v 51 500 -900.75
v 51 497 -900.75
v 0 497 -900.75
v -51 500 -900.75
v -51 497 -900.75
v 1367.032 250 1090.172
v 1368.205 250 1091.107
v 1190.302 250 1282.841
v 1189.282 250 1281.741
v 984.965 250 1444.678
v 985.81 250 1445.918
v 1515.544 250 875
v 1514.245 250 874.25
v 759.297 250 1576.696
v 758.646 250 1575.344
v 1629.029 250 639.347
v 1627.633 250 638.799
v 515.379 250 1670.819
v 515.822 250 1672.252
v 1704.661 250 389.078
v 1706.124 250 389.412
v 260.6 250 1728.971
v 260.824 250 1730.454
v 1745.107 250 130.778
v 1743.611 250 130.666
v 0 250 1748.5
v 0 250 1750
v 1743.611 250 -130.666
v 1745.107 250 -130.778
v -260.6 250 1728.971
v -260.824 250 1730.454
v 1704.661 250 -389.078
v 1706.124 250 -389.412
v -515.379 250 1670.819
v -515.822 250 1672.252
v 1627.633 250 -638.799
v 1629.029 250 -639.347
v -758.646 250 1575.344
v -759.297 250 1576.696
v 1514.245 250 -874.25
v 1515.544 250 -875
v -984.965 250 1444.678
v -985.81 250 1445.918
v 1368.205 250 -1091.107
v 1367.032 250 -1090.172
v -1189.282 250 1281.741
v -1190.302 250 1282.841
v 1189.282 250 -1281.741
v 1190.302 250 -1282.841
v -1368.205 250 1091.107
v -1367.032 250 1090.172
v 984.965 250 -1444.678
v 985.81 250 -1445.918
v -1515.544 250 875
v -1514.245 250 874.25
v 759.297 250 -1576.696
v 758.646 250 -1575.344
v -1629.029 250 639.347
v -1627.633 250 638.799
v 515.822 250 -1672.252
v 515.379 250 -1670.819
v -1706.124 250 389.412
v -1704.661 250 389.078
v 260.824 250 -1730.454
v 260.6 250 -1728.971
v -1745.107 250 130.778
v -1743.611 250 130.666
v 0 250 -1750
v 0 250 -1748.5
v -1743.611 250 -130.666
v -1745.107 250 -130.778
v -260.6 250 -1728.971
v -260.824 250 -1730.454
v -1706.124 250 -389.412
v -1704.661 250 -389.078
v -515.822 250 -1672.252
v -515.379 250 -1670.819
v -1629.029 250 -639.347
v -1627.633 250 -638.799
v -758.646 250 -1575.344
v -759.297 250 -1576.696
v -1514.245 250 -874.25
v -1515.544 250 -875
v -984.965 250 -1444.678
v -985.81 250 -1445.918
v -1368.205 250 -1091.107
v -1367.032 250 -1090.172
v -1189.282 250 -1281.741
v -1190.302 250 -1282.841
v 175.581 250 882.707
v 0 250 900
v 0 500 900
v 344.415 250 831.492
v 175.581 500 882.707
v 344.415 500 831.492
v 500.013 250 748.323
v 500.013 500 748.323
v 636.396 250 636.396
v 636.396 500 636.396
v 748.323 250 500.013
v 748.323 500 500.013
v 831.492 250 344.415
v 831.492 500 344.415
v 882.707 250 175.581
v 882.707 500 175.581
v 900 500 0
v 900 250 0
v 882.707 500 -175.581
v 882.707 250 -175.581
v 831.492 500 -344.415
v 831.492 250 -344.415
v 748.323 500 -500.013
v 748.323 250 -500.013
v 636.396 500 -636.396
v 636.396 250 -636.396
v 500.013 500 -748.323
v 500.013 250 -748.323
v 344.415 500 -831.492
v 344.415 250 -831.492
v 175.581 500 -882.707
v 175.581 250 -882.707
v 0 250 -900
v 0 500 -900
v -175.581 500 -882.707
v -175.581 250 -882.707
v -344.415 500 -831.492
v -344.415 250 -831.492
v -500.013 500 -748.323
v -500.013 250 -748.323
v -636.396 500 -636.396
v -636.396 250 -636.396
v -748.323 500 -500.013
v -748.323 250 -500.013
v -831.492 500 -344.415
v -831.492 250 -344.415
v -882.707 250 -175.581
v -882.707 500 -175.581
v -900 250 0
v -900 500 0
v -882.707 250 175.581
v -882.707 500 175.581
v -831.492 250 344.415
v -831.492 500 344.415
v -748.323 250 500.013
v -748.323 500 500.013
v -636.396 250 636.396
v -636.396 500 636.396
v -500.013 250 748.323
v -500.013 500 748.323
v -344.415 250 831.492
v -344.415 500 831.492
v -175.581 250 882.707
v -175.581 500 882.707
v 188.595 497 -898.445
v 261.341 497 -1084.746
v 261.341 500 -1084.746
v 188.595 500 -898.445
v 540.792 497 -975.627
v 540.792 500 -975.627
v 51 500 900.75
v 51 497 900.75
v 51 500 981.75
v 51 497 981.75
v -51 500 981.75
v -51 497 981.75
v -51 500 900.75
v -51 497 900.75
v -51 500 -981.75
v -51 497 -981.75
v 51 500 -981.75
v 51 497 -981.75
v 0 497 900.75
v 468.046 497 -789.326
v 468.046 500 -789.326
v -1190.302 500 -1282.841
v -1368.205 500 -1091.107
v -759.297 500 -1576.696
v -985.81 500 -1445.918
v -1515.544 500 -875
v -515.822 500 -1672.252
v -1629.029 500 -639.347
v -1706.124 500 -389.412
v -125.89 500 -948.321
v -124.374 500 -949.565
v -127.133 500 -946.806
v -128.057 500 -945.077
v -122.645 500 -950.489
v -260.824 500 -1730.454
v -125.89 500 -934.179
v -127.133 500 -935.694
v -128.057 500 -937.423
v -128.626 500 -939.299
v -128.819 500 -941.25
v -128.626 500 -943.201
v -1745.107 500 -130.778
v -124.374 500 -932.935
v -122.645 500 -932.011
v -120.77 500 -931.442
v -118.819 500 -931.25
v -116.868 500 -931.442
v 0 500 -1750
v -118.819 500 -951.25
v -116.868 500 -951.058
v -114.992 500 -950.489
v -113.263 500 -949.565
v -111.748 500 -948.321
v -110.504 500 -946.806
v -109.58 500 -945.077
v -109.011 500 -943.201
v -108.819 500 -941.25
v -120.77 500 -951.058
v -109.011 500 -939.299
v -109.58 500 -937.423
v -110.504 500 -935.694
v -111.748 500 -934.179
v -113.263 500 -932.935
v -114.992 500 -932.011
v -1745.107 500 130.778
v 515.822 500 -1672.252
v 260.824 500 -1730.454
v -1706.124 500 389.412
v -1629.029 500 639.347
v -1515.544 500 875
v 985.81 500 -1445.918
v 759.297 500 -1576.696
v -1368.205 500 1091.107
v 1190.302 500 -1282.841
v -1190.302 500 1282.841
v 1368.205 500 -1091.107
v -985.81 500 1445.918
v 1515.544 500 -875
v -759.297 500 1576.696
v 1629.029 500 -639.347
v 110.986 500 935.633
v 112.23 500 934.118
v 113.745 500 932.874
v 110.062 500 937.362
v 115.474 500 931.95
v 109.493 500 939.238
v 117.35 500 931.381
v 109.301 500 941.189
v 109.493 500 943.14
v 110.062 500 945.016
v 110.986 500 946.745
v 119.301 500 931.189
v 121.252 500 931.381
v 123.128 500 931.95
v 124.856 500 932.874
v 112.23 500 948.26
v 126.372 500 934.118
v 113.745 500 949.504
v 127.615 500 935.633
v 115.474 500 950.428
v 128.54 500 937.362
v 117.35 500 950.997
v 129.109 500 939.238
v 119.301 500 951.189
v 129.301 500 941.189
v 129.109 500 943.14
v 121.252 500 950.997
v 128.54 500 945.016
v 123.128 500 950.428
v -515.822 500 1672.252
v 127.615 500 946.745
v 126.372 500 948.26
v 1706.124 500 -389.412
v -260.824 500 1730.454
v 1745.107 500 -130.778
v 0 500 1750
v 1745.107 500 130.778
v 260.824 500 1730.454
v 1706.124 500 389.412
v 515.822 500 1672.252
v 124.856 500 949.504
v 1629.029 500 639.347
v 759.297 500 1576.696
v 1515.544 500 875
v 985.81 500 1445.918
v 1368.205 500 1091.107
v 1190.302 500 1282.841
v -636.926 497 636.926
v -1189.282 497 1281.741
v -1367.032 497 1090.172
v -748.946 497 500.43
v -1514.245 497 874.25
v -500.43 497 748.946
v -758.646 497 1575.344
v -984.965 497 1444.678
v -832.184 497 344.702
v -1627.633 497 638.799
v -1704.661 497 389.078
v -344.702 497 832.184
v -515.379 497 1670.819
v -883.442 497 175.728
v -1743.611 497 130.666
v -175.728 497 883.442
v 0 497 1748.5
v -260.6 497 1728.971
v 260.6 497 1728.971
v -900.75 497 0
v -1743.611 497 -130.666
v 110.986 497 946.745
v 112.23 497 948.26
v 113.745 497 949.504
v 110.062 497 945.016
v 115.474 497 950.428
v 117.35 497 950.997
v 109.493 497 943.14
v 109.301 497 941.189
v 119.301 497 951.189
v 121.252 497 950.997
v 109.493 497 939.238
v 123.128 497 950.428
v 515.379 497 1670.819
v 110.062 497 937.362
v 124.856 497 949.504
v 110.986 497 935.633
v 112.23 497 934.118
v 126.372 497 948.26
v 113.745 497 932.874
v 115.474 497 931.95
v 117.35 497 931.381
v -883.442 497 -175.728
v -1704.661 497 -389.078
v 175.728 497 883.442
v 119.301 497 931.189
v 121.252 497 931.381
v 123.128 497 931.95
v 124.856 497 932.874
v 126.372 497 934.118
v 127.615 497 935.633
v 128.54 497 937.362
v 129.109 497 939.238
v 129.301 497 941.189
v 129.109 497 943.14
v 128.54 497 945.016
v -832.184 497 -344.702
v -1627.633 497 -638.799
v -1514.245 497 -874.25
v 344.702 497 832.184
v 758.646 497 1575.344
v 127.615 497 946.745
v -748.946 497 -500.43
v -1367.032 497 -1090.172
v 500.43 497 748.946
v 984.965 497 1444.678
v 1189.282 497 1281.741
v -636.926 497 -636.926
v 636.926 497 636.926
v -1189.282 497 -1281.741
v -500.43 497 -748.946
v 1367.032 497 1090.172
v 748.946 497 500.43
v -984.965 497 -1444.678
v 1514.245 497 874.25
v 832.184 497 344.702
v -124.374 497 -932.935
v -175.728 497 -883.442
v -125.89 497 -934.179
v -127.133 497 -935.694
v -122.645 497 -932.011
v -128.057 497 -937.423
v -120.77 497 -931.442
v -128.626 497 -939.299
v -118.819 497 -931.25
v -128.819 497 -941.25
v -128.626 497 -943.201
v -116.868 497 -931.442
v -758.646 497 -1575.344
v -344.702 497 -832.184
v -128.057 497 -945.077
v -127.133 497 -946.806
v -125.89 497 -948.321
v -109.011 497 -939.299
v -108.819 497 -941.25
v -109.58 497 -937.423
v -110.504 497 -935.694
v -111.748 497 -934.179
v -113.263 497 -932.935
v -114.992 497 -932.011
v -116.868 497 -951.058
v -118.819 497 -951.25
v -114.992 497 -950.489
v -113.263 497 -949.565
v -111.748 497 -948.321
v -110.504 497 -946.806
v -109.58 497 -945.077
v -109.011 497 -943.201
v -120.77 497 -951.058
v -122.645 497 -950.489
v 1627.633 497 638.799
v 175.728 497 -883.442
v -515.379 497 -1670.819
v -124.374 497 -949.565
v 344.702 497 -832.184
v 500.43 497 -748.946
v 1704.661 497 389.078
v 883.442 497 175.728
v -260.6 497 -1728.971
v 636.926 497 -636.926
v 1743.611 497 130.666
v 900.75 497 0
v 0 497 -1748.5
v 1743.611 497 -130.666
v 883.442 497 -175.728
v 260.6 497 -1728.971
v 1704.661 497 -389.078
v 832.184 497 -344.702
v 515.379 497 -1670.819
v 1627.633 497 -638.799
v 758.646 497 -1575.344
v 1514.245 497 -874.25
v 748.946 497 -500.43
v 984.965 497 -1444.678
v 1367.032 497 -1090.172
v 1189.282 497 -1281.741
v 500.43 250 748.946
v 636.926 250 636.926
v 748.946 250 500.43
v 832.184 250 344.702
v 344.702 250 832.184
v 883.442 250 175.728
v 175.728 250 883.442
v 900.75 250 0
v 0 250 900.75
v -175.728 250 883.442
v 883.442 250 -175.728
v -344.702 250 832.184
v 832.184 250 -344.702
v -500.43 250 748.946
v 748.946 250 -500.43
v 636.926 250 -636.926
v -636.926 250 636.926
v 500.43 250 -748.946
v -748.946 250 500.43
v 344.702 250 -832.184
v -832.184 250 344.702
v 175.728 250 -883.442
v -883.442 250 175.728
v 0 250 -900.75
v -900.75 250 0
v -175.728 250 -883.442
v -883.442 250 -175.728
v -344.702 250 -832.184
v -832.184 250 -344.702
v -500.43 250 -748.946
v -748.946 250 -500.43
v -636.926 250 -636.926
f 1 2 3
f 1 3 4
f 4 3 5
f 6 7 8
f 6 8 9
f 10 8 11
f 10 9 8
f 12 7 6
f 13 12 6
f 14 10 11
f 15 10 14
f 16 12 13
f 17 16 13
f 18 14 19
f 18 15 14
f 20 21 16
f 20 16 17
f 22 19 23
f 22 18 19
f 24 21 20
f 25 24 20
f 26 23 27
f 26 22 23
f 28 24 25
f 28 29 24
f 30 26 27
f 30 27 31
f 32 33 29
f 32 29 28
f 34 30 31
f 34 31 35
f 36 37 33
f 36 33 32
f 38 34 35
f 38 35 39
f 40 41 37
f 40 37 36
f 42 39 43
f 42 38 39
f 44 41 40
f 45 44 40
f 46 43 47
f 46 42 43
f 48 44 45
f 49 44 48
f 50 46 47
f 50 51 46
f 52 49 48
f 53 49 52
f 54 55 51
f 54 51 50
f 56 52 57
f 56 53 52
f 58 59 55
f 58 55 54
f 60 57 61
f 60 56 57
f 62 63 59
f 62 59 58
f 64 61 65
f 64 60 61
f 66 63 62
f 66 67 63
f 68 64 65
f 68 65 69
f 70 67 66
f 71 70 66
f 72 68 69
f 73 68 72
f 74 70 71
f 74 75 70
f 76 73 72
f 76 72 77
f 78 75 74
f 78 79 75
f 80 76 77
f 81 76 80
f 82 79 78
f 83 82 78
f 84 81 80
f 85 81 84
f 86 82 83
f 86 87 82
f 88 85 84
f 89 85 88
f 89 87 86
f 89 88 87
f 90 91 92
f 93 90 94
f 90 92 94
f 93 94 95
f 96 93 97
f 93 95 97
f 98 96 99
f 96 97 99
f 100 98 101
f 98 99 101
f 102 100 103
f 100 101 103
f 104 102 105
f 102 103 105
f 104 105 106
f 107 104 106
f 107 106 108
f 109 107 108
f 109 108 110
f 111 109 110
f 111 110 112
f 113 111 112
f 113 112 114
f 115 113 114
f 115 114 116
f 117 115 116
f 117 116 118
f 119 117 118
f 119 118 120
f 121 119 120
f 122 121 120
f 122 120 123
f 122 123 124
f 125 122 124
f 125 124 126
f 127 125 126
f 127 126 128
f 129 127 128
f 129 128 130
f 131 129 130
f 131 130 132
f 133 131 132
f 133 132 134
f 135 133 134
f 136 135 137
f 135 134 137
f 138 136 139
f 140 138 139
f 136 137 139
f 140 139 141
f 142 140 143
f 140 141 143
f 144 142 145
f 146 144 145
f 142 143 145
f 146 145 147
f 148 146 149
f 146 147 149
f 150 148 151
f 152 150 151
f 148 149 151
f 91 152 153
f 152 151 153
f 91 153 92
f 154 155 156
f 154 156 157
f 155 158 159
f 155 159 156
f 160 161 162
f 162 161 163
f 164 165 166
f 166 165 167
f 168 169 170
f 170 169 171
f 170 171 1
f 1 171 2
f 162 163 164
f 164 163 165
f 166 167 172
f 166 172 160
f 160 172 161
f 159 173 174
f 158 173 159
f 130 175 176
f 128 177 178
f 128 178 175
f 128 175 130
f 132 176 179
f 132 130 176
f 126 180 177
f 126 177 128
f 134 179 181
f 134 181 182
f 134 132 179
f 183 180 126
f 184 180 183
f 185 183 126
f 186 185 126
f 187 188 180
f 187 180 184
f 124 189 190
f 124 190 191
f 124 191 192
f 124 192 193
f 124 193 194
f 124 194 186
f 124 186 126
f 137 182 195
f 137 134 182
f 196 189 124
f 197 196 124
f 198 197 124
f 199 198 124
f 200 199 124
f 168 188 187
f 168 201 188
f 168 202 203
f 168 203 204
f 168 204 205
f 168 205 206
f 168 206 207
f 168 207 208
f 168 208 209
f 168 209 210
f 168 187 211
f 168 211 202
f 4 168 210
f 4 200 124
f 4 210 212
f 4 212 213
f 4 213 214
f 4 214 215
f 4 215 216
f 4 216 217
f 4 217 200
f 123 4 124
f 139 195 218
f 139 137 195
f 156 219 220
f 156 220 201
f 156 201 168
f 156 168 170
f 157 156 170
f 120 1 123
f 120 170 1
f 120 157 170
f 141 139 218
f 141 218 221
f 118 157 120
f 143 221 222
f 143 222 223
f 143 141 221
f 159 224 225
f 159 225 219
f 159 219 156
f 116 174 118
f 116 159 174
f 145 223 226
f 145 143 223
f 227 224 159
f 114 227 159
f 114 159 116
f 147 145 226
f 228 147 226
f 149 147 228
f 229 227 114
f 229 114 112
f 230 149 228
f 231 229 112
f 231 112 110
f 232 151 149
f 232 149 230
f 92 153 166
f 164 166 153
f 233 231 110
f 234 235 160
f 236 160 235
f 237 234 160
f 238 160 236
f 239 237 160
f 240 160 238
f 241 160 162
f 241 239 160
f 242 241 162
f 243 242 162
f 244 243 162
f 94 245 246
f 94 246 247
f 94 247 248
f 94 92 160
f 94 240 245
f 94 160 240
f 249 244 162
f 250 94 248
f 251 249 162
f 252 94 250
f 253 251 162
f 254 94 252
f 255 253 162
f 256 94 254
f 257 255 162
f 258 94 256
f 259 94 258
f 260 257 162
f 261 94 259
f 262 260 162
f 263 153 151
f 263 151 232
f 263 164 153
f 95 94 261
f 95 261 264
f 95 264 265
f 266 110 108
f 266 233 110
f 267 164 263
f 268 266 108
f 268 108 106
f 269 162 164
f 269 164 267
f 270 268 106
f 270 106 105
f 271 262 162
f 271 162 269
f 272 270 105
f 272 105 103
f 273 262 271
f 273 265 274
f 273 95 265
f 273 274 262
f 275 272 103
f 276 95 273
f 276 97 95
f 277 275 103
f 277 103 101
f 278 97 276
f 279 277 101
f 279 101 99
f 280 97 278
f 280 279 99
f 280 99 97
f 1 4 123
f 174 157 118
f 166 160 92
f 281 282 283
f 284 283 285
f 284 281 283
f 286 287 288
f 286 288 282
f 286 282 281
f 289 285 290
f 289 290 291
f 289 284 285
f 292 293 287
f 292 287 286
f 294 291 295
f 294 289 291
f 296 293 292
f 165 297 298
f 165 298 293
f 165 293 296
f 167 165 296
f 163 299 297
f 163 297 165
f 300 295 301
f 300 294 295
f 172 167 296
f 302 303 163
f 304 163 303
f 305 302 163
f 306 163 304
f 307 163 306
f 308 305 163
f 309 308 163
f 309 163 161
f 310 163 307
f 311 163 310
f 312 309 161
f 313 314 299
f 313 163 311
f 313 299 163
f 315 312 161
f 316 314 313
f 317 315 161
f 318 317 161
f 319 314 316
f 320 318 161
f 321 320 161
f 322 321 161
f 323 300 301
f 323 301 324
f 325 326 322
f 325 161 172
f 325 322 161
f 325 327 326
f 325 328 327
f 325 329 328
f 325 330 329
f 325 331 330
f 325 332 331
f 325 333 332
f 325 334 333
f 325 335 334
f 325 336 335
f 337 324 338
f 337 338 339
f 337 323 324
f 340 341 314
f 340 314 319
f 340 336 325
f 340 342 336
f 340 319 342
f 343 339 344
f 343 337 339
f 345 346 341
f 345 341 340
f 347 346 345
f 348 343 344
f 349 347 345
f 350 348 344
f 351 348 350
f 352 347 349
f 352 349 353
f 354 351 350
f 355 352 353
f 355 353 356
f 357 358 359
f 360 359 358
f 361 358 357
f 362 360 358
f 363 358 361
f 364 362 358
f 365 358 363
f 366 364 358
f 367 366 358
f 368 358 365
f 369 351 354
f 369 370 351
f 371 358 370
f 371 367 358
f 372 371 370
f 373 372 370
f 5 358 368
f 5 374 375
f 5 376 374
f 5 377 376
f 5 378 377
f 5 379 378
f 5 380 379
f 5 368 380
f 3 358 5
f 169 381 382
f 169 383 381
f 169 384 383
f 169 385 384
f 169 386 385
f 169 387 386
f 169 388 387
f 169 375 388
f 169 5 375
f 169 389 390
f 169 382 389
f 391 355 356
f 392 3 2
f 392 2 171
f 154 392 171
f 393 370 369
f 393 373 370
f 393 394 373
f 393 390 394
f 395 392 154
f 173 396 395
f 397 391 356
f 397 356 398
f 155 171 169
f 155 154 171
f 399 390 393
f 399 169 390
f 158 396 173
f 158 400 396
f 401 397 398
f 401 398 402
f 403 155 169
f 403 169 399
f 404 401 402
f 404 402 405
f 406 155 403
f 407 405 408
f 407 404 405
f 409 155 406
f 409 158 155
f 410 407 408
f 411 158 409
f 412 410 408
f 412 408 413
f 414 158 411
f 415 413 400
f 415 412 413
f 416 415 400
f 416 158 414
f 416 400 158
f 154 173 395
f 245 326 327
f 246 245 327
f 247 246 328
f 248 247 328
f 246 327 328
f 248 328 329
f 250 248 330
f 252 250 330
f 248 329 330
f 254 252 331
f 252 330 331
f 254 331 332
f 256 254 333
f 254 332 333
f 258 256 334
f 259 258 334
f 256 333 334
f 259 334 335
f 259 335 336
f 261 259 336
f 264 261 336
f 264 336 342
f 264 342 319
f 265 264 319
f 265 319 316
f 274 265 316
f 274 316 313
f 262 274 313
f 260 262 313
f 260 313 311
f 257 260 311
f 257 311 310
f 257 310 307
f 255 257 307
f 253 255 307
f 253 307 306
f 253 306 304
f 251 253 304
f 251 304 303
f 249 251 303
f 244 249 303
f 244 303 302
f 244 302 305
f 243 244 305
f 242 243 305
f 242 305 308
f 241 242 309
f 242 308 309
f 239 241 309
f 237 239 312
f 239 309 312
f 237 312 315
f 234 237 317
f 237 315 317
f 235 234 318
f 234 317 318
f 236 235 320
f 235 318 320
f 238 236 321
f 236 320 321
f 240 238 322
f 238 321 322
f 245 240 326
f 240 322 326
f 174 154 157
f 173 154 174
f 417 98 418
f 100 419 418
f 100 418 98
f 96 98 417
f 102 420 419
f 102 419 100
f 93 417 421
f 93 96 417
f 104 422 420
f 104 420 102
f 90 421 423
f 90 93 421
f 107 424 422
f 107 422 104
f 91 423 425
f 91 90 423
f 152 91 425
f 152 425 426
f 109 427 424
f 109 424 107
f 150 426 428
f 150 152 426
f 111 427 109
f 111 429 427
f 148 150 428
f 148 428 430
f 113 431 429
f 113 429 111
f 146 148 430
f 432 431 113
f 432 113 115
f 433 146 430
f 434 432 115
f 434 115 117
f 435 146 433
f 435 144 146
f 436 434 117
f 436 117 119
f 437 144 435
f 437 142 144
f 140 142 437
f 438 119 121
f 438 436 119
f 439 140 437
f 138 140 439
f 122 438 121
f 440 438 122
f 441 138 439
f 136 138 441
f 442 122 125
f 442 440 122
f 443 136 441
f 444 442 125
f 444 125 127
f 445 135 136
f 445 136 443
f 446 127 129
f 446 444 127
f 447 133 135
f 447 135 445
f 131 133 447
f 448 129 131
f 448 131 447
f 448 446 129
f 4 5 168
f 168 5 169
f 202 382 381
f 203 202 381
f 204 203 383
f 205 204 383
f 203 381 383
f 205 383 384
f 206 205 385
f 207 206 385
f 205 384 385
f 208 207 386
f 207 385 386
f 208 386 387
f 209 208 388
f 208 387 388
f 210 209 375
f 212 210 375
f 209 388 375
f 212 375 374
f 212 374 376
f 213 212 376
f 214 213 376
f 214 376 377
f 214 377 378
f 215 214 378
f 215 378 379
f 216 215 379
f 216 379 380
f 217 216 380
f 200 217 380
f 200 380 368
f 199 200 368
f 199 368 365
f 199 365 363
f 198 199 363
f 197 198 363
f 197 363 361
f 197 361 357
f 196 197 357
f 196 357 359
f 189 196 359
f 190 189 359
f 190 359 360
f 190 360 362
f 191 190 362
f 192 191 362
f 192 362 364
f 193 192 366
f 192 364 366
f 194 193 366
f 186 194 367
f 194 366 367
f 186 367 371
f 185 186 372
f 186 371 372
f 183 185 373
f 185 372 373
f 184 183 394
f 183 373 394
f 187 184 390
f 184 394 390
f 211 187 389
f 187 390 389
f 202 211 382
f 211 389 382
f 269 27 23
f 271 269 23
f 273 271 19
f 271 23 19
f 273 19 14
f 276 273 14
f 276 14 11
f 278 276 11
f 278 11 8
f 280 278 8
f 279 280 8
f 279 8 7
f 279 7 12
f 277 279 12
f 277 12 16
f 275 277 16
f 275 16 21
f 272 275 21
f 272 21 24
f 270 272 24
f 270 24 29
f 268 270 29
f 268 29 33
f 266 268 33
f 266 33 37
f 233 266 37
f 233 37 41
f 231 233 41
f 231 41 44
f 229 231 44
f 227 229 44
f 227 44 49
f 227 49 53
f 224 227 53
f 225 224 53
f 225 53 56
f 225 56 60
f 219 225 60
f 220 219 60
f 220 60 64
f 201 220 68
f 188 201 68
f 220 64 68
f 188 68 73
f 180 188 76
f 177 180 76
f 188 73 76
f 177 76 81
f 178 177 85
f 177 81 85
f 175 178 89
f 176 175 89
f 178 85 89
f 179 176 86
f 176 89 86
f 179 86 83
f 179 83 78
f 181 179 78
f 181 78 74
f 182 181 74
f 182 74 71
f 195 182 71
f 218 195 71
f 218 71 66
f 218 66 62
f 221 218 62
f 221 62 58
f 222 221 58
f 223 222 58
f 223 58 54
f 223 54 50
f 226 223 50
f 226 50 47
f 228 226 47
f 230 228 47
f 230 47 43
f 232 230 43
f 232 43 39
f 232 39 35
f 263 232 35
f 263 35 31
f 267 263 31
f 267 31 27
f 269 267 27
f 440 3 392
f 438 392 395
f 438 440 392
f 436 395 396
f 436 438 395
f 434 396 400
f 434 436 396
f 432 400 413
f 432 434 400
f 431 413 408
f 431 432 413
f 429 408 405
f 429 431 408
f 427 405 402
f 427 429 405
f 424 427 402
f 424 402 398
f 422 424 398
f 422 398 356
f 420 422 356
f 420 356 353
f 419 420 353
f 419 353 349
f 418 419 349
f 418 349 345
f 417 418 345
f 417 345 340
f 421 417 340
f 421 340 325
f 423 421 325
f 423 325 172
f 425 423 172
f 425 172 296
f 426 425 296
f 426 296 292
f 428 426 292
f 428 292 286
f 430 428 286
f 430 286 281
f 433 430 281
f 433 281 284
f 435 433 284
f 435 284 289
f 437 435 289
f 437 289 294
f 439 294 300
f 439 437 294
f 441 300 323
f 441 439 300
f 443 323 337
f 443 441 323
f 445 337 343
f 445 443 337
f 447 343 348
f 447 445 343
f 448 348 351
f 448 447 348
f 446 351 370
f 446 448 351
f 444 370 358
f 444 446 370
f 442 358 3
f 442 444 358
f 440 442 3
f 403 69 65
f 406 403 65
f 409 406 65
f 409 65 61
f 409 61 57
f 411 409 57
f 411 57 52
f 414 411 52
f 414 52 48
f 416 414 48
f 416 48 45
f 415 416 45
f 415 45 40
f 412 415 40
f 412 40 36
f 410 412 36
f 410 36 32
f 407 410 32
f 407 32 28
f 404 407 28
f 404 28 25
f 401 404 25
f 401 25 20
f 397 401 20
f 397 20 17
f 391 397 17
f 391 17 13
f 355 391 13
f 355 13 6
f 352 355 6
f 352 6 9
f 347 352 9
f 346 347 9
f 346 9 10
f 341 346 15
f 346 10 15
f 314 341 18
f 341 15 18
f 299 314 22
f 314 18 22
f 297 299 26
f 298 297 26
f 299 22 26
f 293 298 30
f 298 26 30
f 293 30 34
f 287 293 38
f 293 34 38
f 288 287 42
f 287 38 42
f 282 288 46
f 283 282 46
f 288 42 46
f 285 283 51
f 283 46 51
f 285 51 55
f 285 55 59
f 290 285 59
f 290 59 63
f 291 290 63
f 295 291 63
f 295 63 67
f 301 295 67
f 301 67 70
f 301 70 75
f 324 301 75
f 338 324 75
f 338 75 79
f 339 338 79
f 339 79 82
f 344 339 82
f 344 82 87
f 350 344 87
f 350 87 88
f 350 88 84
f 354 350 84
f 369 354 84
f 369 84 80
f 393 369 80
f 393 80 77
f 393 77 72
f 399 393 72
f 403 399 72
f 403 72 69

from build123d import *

# Parameters (mm, degrees)
SKETCH1_R               = 1750
BOSS_EXTRUDE1_DEPTH     = 500
SKETCH2_R               = 900
CUT_EXTRUDE2_DEPTH      = 300
SKETCH3_R               = 600
CUT_EXTRUDE3_DEPTH      = 300
SKETCH4_R               = 1748.5
SKETCH4_R_2             = 900.75
CUT_EXTRUDE5_DEPTH      = 497
CUT_EXTRUDE6_DEPTH      = 2525.876234591
CUT_EXTRUDE6_DEPTH_BACK = 2525.876234591
SKETCH5_W               = 1750
SKETCH5_H               = 250
CUT_EXTRUDE7_DEPTH      = 10
CIRPATTERN1_COUNT       = 2
SKETCH7_R               = 10
CUT_EXTRUDE8_DEPTH      = 10
CUT_EXTRUDE9_DEPTH      = 10


with BuildPart() as part:
    # Sketch1 → Boss-Extrude1 (new body)
    with BuildSketch(Plane(origin=(0, 0, 0), x_dir=(1, 0, 0), z_dir=(0, 1, 0))):
        with Locations(Location((0, 0, 0), (0, 0, 270))):
            Circle(SKETCH1_R)
    extrude(amount=BOSS_EXTRUDE1_DEPTH)

    # Sketch2 → Cut-Extrude2 (cut)
    with BuildSketch(Plane(origin=(0, 500, 0), x_dir=(1, 0, 0), z_dir=(0, 1, 0))):
        with Locations(Location((0, 0, 0), (0, 0, 270))):
            Circle(SKETCH2_R)
    extrude(amount=-CUT_EXTRUDE2_DEPTH, mode=Mode.SUBTRACT)

    # Sketch3 → Cut-Extrude3 (cut)
    with BuildSketch(Plane.XZ):
        with Locations(Location((0, 0, 0), (0, 0, 270))):
            Circle(SKETCH3_R)
    extrude(amount=-CUT_EXTRUDE3_DEPTH, mode=Mode.SUBTRACT)

    # Sketch4 → Cut-Extrude5 (cut)
    with BuildSketch(Plane(origin=(0, 0, 0), x_dir=(-1, 0, 0), z_dir=(0, -1, 0))):
        with Locations(Location((0, 0, 0), (0, 0, 90))):
            Circle(SKETCH4_R)
        with Locations(Location((0, 0, 0), (0, 0, 90))):
            Circle(SKETCH4_R_2, mode=Mode.SUBTRACT)
    extrude(amount=-CUT_EXTRUDE5_DEPTH, mode=Mode.SUBTRACT)

    # Sketch5 → Cut-Extrude6 (cut, two sides: drawn at the far end of the back side and taken through both)
    with BuildSketch(Plane.XY.offset(-CUT_EXTRUDE6_DEPTH_BACK)):
        with Locations((-875, 125)):
            Rectangle(SKETCH5_W, SKETCH5_H)
        with Locations((875, 125)):
            Rectangle(SKETCH5_W, SKETCH5_H)
    extrude(amount=CUT_EXTRUDE6_DEPTH + CUT_EXTRUDE6_DEPTH_BACK, mode=Mode.SUBTRACT)

    # Sketch6 → Cut-Extrude7 (cut)
    with BuildSketch(Plane.XZ.offset(-497)):
        Polygon((0, 900.75), (51, 900.75), (51, 981.75), (-51, 981.75), (-51, 900.75), align=None)
    cut_extrude7 = extrude(amount=-CUT_EXTRUDE7_DEPTH, mode=Mode.SUBTRACT)

    # CirPattern1: Cut-Extrude7 ×2 about axis
    cirpattern1_axis = Axis((0, 0, 0), (0, 1, 0))
    for i in range(1, CIRPATTERN1_COUNT):
        add(cut_extrude7.rotate(cirpattern1_axis, i * 360 / CIRPATTERN1_COUNT), mode=Mode.SUBTRACT)

    # Sketch7 → Cut-Extrude8 (cut)
    with BuildSketch(Plane.XZ.offset(-497)):
        with Locations(Location((-118.818630958, -941.25, 0), (0, 0, 270))):
            Circle(SKETCH7_R)
        with Locations(Location((119.300731455, 941.189016636, 0), (0, 0, 270))):
            Circle(SKETCH7_R)
    extrude(amount=-CUT_EXTRUDE8_DEPTH, mode=Mode.SUBTRACT)

    # Sketch8 → Cut-Extrude9 (cut)
    with BuildSketch(Plane.XZ.offset(-497)):
        Polygon((188.594951024, -898.445391682), (468.046247167, -789.326314141), (540.792298862, -975.627178236), (261.341002718, -1084.746255778), align=None)
    extrude(amount=-CUT_EXTRUDE9_DEPTH, mode=Mode.SUBTRACT)


solid = part.part
